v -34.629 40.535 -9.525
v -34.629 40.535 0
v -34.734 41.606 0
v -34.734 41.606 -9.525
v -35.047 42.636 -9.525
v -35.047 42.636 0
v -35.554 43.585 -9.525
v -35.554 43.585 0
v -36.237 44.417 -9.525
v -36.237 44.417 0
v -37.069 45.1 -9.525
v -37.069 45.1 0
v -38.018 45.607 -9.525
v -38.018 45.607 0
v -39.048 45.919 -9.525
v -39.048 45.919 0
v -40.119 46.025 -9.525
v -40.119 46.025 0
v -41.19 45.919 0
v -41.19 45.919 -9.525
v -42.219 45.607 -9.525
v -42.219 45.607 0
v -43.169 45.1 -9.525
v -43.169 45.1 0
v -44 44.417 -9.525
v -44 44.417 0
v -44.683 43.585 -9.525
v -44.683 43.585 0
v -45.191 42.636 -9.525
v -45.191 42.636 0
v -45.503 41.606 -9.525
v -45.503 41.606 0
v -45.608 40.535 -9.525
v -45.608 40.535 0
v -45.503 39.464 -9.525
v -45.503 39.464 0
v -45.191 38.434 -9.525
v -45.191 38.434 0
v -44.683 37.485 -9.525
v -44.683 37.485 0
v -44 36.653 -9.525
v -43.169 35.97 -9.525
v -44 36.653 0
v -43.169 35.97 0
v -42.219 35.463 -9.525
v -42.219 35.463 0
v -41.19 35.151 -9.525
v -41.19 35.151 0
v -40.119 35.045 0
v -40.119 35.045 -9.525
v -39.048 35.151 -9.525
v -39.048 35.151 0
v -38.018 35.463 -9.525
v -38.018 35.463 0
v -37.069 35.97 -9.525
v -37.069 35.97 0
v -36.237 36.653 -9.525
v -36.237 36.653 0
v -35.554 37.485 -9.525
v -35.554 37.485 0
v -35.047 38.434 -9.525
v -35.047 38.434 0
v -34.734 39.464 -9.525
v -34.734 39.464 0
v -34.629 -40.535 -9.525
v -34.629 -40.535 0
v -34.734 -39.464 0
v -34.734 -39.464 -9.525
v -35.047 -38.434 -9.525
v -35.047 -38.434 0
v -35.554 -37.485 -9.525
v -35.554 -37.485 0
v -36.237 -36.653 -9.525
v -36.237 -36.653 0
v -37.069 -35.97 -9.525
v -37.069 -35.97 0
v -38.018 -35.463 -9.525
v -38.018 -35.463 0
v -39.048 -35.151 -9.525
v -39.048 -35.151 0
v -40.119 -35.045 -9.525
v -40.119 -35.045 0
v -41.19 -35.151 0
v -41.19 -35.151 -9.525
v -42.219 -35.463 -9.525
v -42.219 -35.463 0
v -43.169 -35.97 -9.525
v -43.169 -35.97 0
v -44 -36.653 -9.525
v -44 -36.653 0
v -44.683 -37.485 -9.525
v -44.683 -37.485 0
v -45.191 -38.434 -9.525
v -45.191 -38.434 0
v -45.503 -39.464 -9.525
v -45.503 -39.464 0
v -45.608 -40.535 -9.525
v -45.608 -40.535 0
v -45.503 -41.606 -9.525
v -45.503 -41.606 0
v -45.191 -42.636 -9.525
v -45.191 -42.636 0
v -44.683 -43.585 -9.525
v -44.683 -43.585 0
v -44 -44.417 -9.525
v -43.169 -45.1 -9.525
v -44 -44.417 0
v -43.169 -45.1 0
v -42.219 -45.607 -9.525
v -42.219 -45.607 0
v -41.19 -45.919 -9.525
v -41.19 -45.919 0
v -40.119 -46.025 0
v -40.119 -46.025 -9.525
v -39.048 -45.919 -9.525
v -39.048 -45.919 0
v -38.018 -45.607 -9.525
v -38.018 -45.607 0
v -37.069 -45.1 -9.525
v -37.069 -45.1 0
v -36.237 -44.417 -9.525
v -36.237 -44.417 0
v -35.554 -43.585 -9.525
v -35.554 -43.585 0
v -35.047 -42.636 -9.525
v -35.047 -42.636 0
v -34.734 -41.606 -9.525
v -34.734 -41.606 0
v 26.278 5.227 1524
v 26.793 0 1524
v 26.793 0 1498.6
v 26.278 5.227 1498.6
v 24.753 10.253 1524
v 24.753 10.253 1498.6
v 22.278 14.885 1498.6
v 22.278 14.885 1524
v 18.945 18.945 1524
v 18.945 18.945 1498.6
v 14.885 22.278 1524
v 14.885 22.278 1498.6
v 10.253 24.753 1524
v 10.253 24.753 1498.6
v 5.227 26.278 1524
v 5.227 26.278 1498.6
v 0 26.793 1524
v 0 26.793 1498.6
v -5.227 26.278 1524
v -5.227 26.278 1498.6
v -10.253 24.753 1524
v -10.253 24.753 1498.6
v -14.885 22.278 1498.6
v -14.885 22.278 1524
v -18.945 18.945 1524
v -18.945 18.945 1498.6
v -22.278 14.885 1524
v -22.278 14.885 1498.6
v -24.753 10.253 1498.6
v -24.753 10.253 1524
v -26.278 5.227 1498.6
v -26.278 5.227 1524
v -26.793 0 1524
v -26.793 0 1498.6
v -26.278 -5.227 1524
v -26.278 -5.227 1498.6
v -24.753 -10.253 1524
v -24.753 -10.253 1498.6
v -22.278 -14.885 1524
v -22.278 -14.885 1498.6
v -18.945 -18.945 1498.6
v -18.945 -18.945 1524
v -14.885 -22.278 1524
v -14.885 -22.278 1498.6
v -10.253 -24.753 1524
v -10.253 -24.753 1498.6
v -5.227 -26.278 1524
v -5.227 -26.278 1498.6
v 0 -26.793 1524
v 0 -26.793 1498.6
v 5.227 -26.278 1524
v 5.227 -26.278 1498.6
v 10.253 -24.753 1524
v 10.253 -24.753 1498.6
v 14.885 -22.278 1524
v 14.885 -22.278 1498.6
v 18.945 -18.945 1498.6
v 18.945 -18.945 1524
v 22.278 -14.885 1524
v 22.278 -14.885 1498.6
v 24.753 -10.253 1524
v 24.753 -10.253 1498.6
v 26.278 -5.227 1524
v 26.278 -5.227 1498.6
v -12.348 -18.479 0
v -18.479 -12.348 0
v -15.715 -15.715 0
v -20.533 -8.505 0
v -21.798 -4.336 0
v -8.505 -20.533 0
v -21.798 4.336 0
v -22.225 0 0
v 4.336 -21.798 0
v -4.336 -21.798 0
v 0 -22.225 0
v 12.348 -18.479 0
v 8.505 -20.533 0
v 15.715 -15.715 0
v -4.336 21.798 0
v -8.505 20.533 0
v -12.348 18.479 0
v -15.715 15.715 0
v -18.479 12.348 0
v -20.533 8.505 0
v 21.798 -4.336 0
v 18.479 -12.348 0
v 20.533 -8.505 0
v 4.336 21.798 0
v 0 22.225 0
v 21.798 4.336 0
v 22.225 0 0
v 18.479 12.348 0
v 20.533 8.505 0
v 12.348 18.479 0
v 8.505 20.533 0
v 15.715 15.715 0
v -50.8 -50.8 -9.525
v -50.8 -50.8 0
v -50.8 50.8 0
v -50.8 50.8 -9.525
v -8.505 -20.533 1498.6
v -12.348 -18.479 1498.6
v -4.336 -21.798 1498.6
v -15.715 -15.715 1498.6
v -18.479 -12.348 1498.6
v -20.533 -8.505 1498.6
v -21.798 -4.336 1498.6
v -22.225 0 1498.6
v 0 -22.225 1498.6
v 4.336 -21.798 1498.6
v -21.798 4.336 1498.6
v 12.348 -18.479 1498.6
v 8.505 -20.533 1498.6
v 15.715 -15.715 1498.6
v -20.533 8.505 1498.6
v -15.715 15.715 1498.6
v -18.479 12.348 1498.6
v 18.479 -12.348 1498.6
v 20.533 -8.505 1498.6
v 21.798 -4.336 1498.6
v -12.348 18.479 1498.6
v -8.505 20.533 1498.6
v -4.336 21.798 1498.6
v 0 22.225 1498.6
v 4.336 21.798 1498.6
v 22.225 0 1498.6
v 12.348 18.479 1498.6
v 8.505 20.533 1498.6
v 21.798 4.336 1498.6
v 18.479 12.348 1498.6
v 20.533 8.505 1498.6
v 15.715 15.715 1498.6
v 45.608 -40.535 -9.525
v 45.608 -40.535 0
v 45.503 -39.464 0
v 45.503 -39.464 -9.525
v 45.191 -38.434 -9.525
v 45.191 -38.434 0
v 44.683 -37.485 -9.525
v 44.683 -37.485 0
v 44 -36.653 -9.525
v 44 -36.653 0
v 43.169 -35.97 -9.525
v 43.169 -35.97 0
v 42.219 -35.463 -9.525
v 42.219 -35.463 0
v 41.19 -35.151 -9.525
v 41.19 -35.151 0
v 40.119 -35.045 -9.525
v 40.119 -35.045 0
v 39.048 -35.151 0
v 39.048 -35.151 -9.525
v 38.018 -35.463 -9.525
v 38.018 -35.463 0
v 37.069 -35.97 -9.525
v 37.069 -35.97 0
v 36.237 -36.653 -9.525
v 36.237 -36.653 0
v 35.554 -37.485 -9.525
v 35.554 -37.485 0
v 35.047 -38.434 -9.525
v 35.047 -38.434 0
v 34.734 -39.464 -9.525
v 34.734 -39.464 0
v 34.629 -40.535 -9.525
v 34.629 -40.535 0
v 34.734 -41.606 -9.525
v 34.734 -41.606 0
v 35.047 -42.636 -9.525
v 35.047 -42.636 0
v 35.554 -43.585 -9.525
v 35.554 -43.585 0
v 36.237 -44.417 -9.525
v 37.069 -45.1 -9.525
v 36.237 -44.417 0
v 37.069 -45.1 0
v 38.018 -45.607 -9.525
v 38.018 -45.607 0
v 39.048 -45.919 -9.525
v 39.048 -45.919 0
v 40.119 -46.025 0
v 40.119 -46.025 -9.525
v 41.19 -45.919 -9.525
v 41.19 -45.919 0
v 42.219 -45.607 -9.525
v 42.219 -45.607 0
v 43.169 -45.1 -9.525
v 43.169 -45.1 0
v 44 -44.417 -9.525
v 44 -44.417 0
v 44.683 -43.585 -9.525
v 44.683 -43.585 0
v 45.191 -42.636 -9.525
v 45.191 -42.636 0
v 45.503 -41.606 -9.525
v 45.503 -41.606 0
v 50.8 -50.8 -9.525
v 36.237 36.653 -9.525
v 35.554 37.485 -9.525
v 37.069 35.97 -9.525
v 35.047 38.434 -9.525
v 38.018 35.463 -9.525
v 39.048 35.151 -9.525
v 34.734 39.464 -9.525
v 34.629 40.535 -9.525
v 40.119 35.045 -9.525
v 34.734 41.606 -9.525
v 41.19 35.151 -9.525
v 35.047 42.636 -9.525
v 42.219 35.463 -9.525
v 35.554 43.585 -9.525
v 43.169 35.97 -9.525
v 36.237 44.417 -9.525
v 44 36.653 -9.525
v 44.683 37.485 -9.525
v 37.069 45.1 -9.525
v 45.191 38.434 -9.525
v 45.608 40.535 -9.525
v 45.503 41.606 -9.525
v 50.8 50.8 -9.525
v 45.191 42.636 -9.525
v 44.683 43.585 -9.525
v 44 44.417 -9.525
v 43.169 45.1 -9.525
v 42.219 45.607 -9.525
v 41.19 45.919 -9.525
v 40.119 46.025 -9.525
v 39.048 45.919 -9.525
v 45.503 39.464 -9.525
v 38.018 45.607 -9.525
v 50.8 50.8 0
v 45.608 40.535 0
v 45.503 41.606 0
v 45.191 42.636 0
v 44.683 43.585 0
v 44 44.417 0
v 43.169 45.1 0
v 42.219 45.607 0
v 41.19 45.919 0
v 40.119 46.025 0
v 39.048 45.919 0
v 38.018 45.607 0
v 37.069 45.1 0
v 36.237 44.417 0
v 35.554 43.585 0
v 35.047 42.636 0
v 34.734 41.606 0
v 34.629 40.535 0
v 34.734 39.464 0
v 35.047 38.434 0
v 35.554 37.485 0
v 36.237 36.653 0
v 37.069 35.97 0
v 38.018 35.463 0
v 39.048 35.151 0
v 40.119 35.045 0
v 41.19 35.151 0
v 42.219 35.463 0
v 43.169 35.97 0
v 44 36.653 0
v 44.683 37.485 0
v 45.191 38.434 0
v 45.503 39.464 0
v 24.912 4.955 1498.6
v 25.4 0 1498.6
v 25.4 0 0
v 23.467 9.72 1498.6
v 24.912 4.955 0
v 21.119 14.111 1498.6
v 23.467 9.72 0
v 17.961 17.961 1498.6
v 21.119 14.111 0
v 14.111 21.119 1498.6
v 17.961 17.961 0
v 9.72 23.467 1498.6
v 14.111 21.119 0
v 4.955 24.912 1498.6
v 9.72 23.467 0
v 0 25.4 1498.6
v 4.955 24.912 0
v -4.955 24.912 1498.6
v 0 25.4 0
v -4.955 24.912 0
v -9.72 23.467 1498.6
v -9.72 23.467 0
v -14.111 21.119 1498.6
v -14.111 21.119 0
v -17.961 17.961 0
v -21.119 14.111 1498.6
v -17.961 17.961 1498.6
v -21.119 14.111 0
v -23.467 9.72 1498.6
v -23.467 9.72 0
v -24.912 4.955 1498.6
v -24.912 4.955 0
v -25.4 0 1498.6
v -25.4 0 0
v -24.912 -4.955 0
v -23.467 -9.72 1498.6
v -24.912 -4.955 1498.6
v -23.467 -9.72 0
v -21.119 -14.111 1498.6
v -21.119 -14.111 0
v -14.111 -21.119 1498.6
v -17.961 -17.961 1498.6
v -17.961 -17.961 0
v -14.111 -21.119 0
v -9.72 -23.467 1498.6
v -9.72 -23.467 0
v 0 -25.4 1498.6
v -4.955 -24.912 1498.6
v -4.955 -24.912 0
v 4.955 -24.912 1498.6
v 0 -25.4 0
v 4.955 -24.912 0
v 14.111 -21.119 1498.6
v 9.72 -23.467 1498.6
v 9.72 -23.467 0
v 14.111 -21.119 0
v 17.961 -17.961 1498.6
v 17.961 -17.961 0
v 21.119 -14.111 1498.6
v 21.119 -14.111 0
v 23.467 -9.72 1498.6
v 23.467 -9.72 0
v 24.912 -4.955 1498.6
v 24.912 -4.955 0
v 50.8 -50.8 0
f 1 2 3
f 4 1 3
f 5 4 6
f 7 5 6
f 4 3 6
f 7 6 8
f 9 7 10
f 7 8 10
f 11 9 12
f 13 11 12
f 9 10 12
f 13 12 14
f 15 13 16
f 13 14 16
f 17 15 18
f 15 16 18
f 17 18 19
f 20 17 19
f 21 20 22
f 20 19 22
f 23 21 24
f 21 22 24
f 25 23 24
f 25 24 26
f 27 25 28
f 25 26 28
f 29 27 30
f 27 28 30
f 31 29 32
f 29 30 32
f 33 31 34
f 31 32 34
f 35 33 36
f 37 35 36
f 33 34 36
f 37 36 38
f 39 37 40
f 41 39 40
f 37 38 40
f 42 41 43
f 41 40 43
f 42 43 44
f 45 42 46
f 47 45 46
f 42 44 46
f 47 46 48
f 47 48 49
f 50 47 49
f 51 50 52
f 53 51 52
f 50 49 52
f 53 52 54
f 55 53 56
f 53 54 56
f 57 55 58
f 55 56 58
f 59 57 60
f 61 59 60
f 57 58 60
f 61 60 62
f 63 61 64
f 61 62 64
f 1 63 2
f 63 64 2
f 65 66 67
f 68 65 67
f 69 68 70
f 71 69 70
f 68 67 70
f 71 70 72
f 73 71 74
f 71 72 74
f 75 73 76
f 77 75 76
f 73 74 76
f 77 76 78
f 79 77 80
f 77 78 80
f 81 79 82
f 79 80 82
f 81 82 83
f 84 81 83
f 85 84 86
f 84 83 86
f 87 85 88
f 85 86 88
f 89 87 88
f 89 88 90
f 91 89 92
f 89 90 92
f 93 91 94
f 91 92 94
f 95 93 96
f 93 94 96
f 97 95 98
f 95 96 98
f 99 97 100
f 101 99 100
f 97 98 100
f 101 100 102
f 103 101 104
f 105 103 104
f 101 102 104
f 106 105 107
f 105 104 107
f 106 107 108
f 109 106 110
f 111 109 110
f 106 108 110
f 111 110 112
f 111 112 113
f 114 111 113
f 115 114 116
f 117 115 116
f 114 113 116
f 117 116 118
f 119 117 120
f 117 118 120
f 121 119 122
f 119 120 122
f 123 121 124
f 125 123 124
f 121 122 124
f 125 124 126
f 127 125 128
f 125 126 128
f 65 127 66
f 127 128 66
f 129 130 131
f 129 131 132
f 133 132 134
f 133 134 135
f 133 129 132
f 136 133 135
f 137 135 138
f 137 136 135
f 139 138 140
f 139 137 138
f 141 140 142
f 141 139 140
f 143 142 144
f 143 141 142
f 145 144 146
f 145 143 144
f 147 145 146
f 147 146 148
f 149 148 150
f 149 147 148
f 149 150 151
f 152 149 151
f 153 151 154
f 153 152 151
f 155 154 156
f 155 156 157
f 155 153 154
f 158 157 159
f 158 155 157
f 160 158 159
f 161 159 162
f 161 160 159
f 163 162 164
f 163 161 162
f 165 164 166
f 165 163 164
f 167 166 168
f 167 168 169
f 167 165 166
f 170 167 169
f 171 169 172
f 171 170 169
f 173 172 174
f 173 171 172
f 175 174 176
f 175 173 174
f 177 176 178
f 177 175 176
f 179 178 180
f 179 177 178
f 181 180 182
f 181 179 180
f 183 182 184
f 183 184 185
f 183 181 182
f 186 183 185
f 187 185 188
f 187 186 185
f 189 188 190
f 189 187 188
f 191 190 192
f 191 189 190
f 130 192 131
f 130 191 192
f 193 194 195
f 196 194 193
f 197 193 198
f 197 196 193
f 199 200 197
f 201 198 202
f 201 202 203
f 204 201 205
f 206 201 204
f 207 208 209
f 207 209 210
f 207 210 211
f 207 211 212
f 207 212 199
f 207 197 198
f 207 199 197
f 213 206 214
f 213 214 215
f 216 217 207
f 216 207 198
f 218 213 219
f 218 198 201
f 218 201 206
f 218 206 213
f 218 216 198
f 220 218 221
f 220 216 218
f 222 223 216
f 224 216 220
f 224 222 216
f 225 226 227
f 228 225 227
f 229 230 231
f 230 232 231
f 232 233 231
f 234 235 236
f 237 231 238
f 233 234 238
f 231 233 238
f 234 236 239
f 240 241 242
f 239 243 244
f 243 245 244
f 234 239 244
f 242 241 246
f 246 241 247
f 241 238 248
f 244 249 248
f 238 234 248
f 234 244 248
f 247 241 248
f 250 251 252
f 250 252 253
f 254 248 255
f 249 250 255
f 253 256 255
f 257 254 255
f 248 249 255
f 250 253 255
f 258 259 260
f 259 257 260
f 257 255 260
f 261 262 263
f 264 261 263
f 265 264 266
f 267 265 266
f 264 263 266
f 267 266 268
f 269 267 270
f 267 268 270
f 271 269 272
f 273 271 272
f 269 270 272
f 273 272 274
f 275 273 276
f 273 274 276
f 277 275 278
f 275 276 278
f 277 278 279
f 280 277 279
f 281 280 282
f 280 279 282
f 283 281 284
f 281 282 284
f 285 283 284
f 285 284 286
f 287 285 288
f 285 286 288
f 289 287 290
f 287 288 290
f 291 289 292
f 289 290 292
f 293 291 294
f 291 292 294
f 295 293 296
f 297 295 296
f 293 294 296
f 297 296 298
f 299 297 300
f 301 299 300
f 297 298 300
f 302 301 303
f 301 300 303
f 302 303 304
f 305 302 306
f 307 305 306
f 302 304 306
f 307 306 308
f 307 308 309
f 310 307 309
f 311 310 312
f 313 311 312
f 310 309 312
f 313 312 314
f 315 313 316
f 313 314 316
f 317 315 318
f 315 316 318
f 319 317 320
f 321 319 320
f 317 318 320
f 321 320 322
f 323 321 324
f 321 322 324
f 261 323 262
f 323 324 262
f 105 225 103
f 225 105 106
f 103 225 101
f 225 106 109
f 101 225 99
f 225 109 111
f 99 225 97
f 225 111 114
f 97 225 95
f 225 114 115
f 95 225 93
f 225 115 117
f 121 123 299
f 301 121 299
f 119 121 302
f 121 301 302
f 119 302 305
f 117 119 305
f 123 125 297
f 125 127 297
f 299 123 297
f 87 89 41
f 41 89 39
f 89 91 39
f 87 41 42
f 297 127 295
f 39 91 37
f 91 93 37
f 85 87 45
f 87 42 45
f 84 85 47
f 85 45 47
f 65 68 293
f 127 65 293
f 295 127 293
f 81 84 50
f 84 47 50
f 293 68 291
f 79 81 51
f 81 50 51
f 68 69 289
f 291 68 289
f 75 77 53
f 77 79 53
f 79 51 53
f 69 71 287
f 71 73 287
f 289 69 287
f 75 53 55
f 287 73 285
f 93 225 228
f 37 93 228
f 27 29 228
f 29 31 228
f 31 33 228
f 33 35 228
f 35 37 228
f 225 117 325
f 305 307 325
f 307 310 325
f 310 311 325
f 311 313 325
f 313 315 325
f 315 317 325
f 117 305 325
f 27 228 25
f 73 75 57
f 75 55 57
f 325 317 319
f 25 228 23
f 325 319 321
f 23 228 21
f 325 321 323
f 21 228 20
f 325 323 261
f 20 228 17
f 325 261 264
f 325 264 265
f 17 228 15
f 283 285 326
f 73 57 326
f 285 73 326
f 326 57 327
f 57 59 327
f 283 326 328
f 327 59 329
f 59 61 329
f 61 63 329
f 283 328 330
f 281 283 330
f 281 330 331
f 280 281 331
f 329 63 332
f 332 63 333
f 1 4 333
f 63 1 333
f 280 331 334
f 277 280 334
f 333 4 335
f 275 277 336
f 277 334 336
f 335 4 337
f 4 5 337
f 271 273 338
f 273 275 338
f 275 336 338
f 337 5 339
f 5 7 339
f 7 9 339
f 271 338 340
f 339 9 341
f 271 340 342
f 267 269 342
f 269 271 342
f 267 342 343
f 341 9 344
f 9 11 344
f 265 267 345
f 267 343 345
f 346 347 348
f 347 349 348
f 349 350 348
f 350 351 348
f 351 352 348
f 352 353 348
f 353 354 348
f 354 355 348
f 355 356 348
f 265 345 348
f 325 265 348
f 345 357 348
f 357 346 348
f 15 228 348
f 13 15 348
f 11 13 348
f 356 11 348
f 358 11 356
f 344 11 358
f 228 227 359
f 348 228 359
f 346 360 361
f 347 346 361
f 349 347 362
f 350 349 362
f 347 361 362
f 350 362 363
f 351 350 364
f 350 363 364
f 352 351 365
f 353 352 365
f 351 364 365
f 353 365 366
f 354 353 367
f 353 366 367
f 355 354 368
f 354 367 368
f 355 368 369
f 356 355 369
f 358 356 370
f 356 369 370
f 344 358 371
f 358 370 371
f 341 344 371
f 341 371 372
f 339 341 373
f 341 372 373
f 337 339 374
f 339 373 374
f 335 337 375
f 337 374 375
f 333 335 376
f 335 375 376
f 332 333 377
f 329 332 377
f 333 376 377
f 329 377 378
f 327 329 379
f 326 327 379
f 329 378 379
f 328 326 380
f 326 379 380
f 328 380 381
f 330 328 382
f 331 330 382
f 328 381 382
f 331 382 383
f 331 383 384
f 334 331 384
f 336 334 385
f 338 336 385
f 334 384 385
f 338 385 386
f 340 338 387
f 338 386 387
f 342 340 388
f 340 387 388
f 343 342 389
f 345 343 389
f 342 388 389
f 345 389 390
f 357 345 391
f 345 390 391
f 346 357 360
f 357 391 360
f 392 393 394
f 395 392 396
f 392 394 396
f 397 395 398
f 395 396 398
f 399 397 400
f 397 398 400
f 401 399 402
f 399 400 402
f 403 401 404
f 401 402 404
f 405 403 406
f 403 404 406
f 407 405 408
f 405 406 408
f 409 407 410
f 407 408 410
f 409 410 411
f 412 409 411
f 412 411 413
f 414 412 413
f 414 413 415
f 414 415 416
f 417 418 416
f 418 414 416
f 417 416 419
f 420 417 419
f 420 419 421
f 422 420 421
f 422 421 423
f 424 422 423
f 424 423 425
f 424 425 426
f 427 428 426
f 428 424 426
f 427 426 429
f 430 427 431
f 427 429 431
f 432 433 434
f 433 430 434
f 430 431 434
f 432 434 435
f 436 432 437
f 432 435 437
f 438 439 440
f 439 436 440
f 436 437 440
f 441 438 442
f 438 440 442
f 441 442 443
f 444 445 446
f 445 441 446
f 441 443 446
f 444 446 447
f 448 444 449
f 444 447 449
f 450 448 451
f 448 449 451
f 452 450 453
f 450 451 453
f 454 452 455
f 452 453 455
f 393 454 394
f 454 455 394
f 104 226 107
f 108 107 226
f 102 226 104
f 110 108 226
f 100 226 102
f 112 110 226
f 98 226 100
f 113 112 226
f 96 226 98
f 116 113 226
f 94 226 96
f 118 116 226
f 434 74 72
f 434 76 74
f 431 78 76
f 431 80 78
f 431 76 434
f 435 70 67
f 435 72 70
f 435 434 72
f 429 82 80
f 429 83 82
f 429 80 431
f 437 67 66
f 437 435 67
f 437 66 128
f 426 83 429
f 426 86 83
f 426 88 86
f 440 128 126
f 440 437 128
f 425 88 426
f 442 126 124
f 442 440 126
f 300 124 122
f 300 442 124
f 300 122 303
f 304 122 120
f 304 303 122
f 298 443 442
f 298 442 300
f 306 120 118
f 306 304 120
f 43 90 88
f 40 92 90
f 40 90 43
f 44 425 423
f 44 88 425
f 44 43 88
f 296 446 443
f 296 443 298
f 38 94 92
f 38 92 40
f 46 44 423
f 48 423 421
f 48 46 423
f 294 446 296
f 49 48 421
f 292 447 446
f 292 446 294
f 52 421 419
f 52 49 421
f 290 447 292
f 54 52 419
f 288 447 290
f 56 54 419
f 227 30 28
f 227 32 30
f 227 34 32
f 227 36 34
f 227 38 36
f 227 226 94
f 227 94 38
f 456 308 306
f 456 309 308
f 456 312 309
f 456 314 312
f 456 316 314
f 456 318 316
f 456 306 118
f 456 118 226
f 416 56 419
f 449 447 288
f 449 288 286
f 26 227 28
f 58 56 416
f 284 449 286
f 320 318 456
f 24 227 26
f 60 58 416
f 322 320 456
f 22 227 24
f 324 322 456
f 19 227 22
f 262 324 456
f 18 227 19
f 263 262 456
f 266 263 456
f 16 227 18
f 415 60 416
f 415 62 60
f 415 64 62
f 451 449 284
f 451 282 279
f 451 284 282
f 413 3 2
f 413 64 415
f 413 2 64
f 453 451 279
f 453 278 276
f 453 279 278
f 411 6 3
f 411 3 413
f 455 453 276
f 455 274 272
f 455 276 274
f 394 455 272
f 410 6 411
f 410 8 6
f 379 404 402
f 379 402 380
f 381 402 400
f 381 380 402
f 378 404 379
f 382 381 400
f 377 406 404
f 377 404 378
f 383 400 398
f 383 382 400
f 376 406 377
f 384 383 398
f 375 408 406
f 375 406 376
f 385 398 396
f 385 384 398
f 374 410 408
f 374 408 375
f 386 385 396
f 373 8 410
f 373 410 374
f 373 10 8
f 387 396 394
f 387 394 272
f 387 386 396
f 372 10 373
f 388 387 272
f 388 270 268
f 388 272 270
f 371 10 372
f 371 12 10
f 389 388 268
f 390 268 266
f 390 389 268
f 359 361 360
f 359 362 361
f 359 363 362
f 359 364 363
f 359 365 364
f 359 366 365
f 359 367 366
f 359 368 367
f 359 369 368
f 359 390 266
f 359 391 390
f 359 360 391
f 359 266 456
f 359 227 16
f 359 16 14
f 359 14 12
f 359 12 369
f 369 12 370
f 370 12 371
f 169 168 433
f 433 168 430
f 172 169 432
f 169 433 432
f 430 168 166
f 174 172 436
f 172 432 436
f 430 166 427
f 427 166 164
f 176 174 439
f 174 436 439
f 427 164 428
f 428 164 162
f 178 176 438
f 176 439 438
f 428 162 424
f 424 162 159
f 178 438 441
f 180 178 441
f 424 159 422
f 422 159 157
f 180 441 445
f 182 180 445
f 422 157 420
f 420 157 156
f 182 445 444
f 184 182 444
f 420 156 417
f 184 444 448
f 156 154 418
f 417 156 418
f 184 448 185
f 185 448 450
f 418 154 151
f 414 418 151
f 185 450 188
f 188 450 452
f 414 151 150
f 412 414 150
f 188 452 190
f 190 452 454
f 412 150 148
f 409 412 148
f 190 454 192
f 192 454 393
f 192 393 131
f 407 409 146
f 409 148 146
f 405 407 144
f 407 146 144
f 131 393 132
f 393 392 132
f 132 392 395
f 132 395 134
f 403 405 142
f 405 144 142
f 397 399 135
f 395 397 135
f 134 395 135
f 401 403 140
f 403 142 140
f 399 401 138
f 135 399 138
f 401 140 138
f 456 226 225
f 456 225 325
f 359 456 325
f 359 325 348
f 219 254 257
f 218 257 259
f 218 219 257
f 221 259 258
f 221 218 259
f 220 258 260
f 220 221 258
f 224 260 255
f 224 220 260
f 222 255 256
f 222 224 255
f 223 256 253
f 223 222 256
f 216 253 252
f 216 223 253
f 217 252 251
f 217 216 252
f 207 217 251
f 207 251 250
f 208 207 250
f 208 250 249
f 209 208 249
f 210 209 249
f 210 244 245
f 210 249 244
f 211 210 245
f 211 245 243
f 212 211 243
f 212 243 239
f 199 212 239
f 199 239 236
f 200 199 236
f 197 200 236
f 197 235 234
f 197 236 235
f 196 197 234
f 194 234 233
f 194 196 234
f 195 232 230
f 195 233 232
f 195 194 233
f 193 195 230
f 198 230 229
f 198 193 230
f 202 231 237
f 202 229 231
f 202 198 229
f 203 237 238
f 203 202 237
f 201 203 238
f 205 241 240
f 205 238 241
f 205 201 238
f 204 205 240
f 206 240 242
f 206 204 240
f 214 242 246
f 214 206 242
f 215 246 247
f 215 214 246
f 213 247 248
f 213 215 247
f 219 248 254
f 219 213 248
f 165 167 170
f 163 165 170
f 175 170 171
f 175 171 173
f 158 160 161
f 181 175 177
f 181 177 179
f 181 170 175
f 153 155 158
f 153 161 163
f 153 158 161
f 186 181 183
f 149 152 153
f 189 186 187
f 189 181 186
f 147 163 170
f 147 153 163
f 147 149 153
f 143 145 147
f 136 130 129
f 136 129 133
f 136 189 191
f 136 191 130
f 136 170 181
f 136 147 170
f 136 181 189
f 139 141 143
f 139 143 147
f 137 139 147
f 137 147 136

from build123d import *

# Parameters (mm, degrees)
F0_R     = 25.4
F0_R_2   = 22.225
F1_DEPTH = 1524
F2_W     = 101.6
F2_H     = 101.6
F2_R     = 5.489771
F3_DEPTH = 9.525
F4_R     = 26.792936
F5_DEPTH = 25.4


with BuildPart() as f1:
    # F0 (on Top) → F1 (new body)
    with BuildSketch(Plane.XY):
        Circle(F0_R)
        Circle(F0_R_2, mode=Mode.SUBTRACT)
    extrude(amount=F1_DEPTH)

    # F2 (on Top) → F3 (join)
    with BuildSketch(Plane.XY):
        Rectangle(F2_W, F2_H)
        with Locations((-40.11862, -40.534951)):
            Circle(F2_R, mode=Mode.SUBTRACT)
        with Locations((40.11862, -40.534951)):
            Circle(F2_R, mode=Mode.SUBTRACT)
        with Locations((-40.11862, 40.534951)):
            Circle(F2_R, mode=Mode.SUBTRACT)
        with Locations((40.11862, 40.534951)):
            Circle(F2_R, mode=Mode.SUBTRACT)
    extrude(amount=-F3_DEPTH)

    # F4 (on face) → F5 (join)
    with BuildSketch(Plane.XY.offset(1524)):
        Circle(F4_R)
    extrude(amount=-F5_DEPTH)


solid = f1.part
